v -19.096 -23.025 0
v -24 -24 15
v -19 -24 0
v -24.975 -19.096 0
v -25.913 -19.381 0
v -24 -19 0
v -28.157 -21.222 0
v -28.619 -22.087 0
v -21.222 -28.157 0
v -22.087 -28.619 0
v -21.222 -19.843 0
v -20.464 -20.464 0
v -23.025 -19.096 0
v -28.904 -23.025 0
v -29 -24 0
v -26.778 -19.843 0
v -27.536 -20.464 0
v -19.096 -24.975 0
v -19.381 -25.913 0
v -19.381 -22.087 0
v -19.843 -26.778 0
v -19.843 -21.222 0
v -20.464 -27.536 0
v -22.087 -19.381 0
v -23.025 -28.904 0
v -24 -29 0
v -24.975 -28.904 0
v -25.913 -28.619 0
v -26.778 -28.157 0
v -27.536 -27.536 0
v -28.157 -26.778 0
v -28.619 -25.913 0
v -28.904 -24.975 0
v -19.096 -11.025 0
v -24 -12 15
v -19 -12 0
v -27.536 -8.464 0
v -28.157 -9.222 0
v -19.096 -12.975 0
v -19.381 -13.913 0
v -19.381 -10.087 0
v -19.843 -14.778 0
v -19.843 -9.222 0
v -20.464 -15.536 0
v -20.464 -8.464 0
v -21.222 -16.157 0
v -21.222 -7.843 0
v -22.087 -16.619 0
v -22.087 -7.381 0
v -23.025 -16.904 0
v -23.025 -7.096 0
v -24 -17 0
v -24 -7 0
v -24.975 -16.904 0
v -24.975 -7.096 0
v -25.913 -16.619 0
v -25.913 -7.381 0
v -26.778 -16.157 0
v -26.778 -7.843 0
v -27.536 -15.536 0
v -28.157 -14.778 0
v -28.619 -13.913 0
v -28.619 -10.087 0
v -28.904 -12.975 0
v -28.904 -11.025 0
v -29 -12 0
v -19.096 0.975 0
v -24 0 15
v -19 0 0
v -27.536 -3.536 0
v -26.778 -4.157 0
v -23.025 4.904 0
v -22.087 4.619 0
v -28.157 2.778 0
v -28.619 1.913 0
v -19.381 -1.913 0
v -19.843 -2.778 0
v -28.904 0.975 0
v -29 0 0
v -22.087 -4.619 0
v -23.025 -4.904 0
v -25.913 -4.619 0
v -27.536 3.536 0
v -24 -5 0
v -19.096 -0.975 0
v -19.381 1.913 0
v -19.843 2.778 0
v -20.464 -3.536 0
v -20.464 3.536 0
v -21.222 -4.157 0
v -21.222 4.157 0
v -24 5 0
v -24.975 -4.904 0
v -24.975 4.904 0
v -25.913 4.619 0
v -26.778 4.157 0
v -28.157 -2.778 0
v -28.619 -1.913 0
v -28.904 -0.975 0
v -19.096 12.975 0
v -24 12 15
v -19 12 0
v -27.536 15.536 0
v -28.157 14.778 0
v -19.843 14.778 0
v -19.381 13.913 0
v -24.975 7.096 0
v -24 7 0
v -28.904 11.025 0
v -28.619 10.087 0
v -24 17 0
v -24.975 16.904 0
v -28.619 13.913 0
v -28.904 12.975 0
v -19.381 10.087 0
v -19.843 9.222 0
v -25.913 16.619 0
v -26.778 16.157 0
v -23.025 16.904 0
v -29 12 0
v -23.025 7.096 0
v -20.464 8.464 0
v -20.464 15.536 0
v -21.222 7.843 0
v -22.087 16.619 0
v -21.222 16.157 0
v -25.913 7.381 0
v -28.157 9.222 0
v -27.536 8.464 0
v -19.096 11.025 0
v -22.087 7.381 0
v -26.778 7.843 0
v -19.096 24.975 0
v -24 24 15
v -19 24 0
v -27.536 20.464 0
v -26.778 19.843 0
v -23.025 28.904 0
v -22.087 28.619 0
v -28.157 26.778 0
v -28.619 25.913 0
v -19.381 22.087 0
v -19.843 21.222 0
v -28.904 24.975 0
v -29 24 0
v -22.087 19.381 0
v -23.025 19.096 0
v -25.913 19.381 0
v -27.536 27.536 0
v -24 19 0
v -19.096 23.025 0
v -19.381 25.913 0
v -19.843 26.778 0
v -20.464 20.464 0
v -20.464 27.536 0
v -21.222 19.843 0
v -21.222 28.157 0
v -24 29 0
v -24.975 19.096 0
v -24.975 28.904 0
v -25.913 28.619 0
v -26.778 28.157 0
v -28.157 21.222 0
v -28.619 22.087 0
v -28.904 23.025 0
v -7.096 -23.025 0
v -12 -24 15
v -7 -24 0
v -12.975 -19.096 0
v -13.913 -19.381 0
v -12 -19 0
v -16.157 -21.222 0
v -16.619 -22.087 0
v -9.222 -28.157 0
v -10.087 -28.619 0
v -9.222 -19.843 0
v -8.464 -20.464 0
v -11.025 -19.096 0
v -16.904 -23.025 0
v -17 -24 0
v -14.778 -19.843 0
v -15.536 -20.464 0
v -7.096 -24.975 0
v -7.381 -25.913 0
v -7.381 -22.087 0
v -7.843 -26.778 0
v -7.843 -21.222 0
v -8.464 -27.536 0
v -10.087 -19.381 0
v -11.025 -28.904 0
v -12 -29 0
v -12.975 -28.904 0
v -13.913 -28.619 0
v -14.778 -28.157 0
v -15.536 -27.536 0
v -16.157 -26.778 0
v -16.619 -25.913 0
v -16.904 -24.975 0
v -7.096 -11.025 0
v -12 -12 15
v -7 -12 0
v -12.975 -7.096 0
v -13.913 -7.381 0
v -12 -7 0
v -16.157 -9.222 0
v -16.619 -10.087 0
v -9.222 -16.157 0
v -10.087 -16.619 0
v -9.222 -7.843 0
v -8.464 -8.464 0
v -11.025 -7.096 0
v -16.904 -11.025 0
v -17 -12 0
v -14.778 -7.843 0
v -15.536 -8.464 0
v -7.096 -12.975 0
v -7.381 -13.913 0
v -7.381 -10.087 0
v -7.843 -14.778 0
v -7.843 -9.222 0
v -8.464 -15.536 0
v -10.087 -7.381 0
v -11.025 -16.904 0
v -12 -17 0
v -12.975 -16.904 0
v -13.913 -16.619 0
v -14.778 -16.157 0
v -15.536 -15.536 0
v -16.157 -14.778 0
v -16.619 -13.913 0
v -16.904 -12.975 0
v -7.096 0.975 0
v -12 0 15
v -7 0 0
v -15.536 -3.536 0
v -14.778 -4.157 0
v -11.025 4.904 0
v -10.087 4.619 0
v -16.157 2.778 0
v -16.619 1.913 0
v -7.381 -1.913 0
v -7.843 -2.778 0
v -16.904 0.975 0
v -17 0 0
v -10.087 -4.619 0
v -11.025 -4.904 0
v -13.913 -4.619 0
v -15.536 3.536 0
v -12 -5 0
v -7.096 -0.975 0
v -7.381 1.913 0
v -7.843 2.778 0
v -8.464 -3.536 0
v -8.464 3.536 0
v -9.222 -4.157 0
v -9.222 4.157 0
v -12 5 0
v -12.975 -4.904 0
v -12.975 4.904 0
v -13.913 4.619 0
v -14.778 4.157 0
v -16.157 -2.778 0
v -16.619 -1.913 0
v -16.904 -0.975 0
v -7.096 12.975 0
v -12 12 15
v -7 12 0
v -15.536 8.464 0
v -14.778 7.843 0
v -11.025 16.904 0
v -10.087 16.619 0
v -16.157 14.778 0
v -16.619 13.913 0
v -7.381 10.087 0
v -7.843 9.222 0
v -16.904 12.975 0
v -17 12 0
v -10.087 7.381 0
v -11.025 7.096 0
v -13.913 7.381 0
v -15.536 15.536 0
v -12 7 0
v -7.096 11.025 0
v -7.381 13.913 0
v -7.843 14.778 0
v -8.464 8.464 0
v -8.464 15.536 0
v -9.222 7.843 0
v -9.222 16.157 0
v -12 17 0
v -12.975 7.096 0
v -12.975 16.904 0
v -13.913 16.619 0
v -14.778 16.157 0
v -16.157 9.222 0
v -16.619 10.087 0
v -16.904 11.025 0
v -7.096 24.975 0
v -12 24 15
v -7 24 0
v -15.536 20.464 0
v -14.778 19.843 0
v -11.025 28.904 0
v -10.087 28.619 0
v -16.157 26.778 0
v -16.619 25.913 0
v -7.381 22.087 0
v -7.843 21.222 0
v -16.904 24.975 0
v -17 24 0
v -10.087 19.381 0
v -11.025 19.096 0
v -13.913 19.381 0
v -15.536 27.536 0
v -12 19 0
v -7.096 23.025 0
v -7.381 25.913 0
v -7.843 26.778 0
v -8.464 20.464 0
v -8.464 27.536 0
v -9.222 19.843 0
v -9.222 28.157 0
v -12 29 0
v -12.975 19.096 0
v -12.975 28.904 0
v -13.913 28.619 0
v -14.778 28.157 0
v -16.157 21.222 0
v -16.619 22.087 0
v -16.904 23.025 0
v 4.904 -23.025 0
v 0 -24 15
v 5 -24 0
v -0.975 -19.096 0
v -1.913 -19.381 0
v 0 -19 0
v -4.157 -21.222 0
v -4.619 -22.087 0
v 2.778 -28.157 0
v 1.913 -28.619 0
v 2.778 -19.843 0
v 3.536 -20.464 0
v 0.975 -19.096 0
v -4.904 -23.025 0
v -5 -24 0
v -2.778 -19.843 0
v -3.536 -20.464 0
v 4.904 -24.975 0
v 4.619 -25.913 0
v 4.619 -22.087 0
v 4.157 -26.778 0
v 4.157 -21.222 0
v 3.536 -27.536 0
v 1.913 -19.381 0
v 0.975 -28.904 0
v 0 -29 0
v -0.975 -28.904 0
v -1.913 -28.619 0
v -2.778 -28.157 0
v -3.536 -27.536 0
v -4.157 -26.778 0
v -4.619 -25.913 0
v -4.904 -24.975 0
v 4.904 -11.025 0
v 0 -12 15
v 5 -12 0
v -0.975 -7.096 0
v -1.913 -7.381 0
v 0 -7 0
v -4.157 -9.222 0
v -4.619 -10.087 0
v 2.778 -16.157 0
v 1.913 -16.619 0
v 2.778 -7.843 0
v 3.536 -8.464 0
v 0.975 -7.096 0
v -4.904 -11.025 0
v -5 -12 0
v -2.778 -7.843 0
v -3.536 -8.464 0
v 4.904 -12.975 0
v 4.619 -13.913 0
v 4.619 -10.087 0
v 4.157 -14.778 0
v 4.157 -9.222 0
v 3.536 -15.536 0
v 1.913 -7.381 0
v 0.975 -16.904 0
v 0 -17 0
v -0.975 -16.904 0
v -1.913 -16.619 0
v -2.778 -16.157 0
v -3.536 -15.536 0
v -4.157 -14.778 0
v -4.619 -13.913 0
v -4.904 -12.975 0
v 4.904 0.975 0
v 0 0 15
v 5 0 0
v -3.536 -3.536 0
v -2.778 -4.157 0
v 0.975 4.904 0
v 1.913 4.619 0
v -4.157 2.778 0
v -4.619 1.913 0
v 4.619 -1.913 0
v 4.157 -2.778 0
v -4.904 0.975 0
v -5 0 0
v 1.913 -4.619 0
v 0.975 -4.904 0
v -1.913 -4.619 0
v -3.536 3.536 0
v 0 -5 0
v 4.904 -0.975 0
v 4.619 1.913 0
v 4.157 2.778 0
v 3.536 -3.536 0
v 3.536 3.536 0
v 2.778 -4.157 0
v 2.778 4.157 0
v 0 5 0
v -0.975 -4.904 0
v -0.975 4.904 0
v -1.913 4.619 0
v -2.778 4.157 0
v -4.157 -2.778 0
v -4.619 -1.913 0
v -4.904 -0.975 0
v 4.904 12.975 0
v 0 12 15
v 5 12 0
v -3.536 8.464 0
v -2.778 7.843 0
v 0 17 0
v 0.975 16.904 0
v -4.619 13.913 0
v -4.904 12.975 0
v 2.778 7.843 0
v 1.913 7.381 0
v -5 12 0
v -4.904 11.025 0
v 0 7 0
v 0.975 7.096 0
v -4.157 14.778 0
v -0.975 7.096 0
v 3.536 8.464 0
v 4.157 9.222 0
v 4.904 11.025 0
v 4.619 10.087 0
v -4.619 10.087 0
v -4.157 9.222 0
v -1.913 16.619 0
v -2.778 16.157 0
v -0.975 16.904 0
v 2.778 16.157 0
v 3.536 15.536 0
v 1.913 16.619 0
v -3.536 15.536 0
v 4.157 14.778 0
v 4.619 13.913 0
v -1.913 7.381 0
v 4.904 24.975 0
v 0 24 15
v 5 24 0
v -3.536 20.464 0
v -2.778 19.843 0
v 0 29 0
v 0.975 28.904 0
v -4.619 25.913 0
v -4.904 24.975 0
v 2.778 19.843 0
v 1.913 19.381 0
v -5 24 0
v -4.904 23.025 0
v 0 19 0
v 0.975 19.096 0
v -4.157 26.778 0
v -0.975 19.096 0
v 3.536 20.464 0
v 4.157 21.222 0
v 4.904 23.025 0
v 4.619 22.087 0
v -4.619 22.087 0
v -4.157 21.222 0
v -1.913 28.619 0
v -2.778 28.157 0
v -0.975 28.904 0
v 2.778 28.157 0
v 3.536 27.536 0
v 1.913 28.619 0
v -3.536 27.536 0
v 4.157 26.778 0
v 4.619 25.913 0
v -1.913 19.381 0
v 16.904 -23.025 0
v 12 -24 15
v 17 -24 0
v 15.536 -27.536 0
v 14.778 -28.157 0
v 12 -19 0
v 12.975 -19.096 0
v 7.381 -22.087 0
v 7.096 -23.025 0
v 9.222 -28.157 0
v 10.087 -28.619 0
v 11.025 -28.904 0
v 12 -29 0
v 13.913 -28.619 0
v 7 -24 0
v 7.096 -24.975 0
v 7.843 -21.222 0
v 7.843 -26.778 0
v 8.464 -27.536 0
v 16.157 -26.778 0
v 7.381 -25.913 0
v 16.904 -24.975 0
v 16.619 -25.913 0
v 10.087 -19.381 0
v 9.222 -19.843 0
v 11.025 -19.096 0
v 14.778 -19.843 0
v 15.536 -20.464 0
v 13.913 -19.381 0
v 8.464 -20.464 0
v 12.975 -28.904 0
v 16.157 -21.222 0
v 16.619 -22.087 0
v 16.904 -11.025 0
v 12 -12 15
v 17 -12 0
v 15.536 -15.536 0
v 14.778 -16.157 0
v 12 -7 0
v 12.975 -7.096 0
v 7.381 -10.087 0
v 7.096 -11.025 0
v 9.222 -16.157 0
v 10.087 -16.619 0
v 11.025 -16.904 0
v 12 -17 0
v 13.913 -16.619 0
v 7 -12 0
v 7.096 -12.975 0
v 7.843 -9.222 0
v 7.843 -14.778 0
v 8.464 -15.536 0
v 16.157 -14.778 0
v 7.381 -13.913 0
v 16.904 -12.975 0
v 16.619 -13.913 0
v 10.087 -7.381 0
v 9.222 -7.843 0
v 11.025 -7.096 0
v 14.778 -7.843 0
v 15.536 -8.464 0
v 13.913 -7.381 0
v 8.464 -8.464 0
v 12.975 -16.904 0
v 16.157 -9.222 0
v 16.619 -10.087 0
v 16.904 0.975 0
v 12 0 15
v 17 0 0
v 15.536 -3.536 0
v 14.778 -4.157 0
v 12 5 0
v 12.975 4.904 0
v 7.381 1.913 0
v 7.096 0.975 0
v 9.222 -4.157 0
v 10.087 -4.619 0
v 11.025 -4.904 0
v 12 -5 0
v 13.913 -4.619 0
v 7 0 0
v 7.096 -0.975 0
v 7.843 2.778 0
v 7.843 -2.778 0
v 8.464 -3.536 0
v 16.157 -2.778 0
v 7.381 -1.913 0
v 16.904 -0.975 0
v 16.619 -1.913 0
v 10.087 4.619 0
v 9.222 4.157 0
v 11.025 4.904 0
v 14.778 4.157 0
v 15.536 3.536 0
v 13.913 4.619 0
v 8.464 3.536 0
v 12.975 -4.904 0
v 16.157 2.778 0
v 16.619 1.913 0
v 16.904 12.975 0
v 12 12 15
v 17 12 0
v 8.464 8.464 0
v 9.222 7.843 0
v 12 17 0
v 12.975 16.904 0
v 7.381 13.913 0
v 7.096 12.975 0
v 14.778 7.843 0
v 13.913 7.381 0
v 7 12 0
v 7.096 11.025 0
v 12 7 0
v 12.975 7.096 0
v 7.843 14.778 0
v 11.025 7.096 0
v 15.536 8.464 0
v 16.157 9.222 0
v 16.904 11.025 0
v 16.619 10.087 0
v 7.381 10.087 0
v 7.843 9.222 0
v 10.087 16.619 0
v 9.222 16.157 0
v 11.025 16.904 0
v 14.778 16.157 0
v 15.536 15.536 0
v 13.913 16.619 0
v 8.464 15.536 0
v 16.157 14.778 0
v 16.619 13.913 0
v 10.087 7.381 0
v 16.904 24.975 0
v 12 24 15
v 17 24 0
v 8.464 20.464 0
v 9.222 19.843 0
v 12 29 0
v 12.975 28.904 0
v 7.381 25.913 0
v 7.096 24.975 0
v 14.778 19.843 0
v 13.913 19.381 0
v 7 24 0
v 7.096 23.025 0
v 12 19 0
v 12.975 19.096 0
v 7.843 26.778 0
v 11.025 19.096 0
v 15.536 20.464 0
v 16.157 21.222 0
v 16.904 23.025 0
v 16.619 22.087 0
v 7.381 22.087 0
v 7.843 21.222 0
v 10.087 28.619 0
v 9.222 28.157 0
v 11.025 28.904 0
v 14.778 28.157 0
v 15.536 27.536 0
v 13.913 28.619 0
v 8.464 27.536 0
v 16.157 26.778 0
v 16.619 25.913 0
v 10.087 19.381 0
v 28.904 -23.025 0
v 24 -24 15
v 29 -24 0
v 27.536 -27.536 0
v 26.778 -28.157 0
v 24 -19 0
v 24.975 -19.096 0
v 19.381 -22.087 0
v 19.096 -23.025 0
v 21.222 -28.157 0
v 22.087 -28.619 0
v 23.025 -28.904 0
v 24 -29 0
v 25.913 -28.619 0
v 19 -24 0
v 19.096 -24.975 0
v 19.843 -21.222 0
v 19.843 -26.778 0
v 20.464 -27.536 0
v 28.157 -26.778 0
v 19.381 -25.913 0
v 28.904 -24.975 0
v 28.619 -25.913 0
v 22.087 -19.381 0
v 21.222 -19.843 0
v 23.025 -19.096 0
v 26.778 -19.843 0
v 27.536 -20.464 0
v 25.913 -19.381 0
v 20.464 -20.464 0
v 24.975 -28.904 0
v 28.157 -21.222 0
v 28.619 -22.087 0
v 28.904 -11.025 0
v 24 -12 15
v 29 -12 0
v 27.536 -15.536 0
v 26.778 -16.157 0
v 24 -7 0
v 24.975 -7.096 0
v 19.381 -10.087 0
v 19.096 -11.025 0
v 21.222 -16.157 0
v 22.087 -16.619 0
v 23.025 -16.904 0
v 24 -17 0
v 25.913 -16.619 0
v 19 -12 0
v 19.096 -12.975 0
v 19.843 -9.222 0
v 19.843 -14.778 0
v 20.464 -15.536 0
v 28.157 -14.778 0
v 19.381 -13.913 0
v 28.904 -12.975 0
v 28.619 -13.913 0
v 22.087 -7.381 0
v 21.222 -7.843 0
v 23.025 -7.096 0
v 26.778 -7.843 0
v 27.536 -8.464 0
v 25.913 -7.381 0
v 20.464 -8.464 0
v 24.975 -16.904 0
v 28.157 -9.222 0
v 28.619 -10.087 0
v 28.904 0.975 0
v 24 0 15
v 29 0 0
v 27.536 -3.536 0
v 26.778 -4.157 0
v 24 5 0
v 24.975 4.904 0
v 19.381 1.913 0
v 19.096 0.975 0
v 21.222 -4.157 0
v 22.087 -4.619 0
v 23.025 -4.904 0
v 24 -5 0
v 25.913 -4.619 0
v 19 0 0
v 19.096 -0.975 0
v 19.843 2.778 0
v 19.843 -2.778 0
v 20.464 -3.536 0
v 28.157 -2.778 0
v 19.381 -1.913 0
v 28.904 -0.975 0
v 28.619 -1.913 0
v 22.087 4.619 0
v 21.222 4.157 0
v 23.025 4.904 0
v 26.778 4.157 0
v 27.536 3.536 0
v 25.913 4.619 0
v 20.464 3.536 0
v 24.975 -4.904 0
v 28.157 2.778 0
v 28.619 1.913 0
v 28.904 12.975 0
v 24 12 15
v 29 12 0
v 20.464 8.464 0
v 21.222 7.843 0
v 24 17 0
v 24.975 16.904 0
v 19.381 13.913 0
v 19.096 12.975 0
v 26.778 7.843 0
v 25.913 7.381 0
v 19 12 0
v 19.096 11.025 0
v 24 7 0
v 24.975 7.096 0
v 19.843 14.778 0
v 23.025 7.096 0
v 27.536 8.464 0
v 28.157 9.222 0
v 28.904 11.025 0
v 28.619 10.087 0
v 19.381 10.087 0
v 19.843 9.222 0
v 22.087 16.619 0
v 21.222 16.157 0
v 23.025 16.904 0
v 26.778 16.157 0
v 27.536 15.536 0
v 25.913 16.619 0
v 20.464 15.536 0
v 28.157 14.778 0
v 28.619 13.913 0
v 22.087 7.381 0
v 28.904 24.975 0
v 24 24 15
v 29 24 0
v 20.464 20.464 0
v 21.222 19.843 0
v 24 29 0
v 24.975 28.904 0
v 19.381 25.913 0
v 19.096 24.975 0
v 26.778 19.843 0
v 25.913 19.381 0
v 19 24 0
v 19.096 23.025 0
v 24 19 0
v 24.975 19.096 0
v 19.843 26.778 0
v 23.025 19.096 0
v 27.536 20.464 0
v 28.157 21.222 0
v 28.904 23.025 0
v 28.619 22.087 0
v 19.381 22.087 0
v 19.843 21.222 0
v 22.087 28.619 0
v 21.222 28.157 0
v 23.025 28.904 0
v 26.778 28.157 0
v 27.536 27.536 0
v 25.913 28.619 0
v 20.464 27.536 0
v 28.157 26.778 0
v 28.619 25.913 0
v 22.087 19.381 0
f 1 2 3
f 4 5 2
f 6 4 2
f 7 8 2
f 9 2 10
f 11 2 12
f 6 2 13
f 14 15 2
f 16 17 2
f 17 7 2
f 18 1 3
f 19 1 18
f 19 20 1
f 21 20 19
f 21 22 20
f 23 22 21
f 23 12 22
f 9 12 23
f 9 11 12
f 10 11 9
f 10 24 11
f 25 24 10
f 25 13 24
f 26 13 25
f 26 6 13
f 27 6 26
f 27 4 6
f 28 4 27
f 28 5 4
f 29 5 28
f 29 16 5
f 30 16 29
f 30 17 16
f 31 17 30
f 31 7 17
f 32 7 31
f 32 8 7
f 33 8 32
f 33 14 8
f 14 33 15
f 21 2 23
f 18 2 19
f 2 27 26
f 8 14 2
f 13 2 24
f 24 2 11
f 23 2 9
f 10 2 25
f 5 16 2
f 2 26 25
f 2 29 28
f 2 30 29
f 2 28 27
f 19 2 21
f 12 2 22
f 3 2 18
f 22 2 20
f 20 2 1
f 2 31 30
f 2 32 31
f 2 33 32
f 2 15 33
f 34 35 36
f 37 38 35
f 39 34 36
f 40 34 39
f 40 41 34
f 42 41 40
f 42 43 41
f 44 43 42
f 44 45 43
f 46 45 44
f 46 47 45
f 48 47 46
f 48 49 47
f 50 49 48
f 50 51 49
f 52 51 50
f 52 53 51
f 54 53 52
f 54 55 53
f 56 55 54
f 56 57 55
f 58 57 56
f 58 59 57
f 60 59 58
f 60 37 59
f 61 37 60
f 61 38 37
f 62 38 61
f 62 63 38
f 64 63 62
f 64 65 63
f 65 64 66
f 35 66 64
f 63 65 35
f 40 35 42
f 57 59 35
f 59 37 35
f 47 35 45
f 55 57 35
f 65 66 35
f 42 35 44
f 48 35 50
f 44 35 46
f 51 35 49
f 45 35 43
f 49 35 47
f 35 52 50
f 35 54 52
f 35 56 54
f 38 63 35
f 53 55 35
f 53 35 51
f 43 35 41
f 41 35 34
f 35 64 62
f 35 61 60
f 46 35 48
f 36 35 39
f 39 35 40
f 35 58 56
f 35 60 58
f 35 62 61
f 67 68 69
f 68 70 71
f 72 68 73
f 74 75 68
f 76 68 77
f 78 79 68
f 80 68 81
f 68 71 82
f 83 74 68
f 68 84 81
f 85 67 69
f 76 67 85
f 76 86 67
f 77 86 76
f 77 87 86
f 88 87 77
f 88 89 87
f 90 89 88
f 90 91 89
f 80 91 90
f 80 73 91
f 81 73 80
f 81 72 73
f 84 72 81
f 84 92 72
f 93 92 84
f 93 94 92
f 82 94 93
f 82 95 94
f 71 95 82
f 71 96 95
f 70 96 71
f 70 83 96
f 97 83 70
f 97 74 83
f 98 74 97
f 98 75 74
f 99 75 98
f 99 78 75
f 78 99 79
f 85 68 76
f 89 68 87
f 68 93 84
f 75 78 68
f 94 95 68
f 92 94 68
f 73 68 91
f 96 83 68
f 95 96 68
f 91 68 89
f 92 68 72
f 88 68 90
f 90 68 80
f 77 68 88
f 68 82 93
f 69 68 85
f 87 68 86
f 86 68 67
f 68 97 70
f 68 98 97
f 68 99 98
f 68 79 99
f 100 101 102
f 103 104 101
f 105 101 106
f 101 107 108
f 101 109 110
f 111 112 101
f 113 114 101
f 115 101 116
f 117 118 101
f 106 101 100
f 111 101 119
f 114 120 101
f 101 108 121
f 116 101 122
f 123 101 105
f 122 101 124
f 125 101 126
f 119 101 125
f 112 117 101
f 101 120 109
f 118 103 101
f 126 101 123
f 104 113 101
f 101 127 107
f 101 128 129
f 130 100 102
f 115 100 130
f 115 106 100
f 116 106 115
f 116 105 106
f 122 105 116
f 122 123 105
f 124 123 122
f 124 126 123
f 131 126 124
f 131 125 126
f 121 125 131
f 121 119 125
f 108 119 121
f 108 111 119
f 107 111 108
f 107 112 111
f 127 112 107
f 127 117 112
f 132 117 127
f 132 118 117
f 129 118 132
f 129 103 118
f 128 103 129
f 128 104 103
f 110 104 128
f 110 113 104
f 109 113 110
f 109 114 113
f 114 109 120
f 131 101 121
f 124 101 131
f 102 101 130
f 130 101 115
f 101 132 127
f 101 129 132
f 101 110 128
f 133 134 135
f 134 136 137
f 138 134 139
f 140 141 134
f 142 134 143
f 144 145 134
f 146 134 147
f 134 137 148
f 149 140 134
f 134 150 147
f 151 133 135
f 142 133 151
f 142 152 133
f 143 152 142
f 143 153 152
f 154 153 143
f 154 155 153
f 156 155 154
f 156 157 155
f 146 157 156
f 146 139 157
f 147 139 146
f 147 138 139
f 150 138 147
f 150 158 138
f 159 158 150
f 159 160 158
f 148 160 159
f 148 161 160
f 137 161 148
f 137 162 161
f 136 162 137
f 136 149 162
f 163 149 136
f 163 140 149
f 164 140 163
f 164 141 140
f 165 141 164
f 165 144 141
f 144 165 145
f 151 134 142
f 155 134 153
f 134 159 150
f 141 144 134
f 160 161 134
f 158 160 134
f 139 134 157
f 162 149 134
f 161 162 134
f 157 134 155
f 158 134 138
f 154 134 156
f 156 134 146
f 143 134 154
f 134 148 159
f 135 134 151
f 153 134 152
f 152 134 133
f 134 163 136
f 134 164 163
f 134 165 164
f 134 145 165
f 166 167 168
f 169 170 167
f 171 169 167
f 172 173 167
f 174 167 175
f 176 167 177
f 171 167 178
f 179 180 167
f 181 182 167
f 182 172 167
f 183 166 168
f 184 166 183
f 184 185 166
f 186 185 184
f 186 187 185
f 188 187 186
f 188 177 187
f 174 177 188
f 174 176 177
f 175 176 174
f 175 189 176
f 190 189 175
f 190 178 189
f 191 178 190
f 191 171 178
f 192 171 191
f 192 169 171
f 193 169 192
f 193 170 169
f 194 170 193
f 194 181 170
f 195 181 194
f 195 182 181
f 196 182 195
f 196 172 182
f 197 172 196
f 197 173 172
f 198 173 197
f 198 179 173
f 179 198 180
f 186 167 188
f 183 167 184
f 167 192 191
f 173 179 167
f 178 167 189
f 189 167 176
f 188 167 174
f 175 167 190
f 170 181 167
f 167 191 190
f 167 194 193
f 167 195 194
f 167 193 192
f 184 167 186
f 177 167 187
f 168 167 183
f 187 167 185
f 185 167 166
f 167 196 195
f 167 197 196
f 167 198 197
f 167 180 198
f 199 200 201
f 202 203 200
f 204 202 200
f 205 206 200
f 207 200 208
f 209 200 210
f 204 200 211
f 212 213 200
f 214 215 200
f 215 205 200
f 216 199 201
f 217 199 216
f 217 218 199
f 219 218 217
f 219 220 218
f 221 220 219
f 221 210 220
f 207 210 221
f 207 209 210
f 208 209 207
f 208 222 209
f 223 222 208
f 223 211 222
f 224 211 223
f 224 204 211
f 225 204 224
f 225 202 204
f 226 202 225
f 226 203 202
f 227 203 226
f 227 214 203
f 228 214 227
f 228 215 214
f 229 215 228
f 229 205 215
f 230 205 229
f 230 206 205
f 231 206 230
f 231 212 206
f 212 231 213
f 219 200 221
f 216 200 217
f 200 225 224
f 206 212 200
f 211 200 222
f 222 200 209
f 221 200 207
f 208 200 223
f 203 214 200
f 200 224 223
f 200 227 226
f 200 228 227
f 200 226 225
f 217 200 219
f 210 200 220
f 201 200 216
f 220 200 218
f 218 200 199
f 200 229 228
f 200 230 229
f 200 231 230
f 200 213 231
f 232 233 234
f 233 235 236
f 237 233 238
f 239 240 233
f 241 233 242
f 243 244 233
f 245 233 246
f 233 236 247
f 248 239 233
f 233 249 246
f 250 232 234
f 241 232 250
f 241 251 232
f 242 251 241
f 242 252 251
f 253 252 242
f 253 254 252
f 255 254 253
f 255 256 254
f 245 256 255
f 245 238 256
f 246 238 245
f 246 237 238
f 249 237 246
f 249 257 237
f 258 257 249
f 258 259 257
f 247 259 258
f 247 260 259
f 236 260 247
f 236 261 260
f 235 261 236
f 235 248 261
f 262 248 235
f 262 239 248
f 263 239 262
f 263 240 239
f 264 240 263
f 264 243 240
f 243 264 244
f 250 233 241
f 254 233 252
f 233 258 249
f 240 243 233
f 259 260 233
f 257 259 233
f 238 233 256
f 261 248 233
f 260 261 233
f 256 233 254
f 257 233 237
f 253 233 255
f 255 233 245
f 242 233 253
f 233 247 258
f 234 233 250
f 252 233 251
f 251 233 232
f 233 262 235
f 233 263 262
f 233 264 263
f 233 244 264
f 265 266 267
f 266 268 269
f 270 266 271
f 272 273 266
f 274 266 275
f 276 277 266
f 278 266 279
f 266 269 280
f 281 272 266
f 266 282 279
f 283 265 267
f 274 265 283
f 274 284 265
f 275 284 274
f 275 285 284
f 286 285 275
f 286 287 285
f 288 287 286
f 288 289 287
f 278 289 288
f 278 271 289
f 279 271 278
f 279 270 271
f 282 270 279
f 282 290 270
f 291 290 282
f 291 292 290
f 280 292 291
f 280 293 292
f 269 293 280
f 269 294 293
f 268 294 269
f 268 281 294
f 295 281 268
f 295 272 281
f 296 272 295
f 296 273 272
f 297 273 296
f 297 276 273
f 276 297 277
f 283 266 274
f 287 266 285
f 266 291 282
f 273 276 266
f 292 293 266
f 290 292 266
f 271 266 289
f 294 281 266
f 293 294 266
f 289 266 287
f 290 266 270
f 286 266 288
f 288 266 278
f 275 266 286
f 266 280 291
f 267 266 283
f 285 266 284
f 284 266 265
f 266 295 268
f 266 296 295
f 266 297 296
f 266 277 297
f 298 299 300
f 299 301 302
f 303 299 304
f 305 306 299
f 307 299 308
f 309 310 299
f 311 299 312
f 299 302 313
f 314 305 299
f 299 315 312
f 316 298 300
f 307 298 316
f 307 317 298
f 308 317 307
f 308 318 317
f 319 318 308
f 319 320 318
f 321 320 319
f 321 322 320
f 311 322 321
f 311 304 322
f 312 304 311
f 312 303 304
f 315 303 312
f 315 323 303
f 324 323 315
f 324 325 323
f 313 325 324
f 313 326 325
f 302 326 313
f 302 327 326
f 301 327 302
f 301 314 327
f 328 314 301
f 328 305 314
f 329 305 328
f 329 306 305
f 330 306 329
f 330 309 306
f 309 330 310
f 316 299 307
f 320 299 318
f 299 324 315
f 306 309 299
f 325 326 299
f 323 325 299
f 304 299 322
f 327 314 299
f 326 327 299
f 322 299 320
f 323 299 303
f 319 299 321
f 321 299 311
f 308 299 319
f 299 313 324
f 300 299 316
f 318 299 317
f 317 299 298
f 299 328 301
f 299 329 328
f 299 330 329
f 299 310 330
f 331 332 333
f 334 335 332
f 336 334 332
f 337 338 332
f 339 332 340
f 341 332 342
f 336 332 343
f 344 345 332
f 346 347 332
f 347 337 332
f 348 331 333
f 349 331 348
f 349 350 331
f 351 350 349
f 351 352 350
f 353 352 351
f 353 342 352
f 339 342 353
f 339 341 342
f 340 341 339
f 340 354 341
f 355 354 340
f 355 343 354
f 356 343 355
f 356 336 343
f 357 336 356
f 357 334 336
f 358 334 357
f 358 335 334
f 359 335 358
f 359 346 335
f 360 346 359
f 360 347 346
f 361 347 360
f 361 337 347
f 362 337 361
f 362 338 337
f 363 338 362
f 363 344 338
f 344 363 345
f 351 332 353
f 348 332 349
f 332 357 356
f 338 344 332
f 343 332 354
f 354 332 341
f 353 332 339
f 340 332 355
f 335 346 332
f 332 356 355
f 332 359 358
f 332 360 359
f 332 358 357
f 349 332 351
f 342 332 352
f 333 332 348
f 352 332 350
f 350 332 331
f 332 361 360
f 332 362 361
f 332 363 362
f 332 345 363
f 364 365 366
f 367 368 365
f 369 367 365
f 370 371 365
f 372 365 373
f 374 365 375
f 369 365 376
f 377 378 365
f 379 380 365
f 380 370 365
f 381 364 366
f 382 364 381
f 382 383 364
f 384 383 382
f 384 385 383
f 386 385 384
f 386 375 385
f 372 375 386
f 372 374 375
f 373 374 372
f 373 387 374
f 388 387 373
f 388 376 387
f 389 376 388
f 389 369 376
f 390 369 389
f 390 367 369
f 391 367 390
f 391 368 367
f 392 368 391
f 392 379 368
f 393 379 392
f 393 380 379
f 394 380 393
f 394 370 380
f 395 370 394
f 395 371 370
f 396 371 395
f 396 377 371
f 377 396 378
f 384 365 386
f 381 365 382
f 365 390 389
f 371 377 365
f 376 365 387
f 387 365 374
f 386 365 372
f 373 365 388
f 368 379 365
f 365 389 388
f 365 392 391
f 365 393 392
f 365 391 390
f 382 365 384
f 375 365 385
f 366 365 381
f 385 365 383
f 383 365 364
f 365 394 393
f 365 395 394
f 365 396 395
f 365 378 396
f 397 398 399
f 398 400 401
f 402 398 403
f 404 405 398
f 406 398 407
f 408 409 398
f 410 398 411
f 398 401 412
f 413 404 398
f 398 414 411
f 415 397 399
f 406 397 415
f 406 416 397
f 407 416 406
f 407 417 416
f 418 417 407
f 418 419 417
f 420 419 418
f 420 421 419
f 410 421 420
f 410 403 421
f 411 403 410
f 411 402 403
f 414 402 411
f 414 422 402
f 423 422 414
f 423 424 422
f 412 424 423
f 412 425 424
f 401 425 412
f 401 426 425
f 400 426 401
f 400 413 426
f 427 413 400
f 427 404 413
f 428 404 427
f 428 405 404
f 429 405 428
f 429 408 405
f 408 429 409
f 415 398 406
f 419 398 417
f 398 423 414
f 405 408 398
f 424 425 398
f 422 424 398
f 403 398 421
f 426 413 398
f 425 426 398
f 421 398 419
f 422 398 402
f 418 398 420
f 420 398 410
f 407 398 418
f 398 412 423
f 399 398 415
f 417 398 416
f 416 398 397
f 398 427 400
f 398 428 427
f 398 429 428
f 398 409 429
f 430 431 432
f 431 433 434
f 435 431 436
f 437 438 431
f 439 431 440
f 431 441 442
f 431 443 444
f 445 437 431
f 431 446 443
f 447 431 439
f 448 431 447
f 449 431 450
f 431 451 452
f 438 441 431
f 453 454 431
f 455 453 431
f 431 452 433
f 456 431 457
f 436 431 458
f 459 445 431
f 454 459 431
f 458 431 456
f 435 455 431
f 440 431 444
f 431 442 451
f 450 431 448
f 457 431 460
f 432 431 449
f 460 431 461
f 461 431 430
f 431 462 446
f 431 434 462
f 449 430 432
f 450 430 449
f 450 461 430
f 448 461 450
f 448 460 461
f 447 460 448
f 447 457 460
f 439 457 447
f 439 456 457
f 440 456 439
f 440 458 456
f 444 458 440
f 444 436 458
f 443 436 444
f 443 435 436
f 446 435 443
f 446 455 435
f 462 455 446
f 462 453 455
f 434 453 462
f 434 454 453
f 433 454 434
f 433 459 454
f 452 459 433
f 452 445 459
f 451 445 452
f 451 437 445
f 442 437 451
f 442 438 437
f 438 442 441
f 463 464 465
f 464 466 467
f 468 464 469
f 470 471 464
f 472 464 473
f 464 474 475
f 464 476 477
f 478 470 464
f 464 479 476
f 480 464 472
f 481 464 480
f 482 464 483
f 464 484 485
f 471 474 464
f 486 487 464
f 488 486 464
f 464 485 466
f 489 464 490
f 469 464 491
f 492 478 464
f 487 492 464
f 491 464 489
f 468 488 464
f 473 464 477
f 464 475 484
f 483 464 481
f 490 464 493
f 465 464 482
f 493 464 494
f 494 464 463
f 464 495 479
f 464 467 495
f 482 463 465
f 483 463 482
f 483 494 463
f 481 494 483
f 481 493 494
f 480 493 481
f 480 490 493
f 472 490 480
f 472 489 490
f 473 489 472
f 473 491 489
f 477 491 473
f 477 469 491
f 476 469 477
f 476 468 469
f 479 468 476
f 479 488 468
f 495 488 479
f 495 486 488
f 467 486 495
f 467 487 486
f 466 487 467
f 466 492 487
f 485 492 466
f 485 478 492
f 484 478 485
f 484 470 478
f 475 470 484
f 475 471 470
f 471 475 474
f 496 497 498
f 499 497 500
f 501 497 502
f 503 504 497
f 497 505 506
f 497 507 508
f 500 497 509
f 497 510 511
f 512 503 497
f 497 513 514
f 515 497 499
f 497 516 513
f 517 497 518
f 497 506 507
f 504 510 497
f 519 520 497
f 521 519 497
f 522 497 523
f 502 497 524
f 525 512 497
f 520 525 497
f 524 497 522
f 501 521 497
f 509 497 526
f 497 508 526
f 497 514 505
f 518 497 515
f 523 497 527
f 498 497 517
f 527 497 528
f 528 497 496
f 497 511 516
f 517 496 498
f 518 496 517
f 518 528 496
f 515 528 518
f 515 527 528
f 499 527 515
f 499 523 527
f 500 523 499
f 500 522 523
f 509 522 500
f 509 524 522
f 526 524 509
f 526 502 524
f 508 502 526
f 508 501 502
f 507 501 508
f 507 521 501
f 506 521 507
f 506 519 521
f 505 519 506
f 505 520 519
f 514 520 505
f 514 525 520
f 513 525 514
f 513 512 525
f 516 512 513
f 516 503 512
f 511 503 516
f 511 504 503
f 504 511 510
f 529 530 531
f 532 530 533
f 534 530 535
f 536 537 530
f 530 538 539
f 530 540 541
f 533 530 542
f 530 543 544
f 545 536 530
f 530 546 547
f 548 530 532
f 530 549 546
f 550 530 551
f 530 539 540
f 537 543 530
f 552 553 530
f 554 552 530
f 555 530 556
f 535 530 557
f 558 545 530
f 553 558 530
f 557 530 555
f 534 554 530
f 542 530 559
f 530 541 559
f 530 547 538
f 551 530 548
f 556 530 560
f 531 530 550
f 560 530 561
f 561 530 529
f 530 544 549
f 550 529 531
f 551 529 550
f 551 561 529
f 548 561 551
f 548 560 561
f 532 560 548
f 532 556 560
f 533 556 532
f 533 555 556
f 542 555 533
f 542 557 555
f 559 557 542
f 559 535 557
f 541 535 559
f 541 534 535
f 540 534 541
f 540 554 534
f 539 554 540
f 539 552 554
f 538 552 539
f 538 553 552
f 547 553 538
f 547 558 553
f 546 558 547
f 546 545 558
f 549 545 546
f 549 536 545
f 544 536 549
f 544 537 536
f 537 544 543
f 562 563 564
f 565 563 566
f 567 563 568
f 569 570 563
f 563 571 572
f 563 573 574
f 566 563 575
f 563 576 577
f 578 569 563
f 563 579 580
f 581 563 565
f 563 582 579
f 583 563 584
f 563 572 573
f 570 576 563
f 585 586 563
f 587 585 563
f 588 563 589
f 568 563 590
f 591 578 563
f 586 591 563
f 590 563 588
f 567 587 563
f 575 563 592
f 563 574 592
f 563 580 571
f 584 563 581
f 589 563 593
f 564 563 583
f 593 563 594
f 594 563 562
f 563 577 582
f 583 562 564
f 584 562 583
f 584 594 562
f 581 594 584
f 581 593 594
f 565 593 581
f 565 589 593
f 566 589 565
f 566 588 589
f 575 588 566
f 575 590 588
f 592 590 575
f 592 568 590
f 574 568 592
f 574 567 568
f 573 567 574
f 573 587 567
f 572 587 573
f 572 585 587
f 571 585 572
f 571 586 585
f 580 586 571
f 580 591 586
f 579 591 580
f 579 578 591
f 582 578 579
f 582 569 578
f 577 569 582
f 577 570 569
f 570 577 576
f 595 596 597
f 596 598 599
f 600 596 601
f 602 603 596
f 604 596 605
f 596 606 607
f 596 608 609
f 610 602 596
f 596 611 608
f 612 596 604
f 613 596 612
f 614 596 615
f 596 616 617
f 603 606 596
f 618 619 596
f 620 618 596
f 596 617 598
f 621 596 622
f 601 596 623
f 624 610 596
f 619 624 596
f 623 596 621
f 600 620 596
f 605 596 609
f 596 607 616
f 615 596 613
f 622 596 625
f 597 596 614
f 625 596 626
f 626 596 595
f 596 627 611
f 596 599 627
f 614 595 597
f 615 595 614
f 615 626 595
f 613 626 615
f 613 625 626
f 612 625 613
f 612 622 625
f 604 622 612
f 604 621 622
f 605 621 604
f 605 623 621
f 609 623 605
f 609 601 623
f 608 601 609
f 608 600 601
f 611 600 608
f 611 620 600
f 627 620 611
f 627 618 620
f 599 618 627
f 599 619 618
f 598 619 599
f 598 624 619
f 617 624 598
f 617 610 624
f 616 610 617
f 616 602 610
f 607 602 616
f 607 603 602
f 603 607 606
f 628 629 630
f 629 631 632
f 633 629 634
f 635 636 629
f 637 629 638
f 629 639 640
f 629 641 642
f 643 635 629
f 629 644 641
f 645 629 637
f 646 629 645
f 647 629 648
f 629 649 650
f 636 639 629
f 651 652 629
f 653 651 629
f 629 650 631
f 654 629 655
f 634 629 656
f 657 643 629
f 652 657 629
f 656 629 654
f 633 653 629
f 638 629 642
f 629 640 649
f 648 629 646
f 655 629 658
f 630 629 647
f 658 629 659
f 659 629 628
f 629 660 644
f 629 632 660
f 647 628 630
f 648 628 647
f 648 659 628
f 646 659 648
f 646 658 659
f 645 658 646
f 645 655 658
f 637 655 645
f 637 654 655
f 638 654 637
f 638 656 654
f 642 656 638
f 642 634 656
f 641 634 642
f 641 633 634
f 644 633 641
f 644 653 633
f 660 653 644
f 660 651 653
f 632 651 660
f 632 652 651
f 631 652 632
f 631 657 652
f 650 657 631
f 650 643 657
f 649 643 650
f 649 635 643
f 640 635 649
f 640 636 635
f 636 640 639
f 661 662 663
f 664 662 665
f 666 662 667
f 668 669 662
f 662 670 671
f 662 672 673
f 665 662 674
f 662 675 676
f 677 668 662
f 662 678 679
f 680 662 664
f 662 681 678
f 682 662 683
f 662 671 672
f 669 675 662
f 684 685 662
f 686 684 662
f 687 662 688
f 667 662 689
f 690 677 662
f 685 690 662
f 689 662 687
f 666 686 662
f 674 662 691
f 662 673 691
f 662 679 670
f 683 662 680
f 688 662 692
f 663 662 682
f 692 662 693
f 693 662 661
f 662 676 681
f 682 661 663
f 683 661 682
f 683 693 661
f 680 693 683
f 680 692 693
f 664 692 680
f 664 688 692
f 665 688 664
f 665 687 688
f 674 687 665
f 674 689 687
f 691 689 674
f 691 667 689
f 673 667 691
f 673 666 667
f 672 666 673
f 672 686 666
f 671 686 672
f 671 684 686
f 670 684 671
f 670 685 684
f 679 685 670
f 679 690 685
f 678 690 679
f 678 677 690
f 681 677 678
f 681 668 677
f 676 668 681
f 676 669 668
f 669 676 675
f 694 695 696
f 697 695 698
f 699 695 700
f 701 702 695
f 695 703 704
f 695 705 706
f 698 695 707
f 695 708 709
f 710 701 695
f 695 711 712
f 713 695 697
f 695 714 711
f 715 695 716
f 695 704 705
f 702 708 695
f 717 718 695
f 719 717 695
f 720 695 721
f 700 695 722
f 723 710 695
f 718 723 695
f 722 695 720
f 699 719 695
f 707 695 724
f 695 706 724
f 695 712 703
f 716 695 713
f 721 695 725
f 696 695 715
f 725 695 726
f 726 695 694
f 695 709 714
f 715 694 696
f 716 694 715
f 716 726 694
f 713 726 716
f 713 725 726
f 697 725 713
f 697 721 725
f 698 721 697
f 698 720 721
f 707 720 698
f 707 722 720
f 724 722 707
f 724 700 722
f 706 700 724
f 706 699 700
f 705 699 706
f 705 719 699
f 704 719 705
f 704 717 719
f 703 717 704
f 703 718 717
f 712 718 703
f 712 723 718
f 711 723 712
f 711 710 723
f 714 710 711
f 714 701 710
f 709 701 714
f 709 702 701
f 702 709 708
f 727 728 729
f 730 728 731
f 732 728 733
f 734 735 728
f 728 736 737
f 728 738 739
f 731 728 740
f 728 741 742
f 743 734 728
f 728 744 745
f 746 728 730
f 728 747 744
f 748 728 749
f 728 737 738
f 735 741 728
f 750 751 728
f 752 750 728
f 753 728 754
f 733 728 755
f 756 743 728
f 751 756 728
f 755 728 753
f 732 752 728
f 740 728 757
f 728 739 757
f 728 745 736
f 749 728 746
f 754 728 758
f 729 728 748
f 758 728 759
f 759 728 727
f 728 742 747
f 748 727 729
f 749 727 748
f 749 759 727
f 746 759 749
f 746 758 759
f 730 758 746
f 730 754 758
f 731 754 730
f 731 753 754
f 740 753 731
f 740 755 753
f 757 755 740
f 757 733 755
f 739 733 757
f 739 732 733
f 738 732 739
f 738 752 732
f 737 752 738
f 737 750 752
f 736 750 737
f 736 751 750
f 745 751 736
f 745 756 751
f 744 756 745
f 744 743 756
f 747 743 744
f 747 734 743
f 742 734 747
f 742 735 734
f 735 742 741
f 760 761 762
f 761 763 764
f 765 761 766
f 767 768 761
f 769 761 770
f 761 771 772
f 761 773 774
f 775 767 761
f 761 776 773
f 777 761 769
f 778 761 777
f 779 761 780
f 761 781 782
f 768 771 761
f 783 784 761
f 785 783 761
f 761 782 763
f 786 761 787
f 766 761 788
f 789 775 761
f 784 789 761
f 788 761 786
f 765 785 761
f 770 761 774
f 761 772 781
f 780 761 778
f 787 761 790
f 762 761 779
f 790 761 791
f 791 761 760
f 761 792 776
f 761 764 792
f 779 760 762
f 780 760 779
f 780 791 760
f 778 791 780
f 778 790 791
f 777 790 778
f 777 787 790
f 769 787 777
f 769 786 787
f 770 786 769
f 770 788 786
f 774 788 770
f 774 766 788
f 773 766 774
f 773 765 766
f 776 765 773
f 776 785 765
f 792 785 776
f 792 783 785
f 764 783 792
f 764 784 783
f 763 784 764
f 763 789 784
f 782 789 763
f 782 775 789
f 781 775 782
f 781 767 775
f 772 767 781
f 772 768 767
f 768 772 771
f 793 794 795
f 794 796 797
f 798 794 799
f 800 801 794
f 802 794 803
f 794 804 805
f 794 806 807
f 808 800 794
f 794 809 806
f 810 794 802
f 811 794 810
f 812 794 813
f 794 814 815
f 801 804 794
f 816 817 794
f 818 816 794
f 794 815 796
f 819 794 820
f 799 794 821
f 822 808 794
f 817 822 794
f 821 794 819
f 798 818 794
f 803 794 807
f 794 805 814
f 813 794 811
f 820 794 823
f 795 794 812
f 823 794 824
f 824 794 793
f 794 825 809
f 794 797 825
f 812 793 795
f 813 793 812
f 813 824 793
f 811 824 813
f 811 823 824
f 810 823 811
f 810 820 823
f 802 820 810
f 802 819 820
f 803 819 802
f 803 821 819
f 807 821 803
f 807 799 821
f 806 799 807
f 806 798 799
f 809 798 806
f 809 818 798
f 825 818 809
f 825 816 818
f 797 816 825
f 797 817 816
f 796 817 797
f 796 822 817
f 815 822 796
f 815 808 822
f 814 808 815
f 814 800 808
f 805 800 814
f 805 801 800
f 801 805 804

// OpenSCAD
// Example: Cone Array
$fn=32;
for (x=[-2:2], y=[-2:2]) {
    translate([x*12, y*12, 0])
        cylinder(h=15, r1=5, r2=0);
}
